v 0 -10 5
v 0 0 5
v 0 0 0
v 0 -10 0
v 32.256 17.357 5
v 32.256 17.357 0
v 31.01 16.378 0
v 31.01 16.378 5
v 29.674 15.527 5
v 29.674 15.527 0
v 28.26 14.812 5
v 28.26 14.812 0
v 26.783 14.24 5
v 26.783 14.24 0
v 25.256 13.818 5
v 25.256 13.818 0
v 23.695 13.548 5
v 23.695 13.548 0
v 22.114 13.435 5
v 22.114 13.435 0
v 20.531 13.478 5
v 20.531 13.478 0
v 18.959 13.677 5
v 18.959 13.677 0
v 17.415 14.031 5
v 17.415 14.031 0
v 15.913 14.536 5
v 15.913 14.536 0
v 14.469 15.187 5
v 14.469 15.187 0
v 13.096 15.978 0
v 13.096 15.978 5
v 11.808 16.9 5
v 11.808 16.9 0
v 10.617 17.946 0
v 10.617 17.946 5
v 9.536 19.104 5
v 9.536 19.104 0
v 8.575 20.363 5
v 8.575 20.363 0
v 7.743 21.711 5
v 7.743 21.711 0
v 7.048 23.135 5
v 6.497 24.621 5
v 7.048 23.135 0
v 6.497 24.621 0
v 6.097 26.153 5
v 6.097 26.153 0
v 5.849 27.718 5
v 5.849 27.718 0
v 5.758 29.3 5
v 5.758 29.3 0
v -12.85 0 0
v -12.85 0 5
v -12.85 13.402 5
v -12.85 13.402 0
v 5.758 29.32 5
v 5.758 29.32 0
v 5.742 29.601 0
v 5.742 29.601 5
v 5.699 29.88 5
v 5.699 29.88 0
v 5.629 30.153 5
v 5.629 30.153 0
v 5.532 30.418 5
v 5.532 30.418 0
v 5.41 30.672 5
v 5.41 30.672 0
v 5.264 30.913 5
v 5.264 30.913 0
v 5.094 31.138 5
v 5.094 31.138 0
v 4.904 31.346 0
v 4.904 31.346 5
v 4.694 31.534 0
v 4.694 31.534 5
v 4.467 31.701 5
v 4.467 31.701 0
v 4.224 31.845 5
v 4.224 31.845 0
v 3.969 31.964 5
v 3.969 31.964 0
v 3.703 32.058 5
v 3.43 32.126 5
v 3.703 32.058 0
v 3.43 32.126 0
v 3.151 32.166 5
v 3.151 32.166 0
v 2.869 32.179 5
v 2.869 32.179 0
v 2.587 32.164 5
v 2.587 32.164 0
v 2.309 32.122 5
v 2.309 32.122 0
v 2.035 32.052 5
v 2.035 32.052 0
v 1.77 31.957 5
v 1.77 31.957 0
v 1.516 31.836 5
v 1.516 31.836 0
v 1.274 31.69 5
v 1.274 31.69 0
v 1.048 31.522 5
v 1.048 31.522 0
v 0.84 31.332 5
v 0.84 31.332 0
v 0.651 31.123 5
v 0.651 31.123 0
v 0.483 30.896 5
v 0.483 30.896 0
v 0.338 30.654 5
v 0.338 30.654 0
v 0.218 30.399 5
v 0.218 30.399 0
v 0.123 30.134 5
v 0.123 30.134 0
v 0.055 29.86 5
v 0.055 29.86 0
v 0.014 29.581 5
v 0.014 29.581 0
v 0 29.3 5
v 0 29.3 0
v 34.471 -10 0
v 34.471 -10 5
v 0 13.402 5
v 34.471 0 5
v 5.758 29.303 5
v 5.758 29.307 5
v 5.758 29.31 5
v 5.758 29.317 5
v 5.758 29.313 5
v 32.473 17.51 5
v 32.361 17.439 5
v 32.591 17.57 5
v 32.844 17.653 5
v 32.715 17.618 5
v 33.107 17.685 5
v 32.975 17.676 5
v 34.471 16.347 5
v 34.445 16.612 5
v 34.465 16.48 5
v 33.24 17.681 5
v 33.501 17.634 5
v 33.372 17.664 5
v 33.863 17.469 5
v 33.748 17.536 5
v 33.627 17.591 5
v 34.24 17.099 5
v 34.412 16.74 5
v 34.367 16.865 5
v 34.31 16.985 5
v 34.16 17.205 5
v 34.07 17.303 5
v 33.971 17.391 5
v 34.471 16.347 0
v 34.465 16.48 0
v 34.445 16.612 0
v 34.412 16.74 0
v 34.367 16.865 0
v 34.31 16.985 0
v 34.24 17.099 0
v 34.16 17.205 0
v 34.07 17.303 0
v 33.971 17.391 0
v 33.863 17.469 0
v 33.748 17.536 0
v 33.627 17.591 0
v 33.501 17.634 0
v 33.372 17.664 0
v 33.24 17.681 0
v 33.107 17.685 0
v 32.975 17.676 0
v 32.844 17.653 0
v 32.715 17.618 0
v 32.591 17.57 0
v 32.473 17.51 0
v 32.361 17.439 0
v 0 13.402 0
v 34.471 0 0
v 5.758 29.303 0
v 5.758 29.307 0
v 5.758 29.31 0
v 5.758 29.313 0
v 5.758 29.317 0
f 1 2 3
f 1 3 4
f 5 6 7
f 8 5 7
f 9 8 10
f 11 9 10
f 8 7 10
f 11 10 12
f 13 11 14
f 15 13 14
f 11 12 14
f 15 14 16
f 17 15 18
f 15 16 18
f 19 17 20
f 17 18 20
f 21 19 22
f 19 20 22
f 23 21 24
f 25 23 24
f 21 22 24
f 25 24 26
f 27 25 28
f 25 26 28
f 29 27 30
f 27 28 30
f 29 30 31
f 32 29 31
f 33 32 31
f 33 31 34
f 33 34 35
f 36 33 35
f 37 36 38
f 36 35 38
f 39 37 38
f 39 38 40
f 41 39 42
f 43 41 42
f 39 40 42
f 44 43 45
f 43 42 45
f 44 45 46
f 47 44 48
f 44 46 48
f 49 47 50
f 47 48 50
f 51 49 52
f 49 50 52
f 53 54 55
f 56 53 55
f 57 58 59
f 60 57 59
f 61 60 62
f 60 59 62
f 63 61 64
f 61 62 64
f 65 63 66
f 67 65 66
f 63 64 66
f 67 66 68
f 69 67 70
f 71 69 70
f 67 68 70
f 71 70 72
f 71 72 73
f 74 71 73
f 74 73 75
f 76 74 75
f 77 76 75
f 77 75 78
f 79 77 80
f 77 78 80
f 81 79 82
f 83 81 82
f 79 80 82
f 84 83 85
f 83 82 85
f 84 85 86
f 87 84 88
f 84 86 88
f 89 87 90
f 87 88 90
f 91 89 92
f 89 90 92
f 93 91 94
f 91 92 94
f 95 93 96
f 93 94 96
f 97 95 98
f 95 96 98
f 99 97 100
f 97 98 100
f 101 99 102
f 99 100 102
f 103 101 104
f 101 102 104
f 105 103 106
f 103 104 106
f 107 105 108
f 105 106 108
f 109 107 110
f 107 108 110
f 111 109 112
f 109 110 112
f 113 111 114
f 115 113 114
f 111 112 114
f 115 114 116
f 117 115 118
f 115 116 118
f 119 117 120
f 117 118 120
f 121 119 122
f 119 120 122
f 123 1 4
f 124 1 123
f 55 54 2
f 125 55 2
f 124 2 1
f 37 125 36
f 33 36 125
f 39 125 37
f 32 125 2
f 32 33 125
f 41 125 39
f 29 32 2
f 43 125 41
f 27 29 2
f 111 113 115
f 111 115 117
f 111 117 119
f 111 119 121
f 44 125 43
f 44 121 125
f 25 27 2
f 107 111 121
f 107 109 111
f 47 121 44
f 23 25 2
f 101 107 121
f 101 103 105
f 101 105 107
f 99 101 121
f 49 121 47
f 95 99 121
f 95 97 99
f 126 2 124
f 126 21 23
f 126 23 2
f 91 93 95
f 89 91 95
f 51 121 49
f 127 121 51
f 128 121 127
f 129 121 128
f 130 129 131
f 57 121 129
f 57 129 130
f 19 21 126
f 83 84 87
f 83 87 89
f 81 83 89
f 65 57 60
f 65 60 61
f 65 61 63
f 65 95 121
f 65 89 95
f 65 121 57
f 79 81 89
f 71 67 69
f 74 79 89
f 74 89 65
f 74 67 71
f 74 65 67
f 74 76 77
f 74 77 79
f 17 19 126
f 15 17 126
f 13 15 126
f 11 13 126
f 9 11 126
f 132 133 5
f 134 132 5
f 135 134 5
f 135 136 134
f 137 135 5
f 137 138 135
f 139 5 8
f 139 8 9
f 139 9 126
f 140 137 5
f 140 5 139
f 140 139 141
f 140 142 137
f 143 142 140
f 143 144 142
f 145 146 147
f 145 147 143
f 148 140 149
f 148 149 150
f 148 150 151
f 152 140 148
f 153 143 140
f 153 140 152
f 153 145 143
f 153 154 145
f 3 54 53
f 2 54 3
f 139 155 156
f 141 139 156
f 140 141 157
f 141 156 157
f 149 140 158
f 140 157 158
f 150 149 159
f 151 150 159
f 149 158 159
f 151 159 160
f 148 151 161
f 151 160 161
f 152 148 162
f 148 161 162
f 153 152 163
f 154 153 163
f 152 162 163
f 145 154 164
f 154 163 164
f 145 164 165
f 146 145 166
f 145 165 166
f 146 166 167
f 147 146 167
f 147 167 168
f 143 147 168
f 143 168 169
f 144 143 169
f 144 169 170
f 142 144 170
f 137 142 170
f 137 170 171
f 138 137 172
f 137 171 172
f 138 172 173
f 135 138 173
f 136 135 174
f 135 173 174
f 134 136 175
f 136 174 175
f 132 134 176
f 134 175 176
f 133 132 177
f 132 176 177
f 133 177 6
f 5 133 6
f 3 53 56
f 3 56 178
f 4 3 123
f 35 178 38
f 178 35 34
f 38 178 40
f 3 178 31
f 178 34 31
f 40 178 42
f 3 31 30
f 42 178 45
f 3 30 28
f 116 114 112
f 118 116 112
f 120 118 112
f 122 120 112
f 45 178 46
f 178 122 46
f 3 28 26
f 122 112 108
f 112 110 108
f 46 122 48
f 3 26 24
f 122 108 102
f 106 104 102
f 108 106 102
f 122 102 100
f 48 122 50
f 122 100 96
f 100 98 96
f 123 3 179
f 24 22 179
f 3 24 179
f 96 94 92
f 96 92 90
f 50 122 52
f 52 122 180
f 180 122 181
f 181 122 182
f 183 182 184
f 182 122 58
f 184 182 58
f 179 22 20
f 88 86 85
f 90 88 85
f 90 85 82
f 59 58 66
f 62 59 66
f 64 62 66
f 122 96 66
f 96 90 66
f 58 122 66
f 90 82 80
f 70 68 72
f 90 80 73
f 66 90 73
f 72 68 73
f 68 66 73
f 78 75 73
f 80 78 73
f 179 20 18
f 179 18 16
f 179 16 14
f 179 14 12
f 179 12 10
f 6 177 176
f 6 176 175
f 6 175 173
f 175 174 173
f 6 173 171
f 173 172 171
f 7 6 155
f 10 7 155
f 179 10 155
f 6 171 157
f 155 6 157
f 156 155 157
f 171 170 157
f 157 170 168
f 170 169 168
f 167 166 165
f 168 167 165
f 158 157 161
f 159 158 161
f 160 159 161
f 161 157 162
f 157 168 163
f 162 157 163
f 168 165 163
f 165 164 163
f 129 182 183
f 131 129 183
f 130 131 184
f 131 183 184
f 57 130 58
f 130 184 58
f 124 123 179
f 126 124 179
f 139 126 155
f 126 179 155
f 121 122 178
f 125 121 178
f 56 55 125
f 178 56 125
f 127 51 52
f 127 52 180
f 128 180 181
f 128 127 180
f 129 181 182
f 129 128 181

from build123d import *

# Parameters (mm, degrees)
F1_DEPTH = 5
F2_W     = 34.4714387385
F2_H     = 10
F2_W_2   = 12.8498794511
F2_H_2   = 13.4021639824
F3_DEPTH = 5


# Not quite as in the source:
# - ends of sketch curves that miss each other by under 0.0002 mm in the source are joined
# - a feature names something its author has since deleted; it is built from what else it names


with BuildPart() as f1:
    # F0 (on Top) → F1 (new body)
    with BuildSketch(Plane.XY):
        with BuildLine():
            Line((0, 29.2999204248), (0, 0))
            Line((0, 0), (34.4714387385, 0))
            Line((34.4714387385, 0), (34.4714387385, 16.3473710418))
            ThreePointArc((34.4714387385, 16.3473710418), (32.5790927131, 15.1300794804), (32.2559916738, 17.3568210333))
            ThreePointArc((32.2559916738, 17.3568210333), (15.182844974, 14.8438668457), (5.7578901922, 29.2999210911))
            ThreePointArc((5.7578901922, 29.2999210911), (2.8789043427, 26.4210160822), (0, 29.2999204248))
        make_face()
        with BuildLine():
            ThreePointArc((5.7577396052, 29.3198639813), (2.8689325046, 32.1788074974), (0, 29.2999204248))
            ThreePointArc((0, 29.2999204248), (2.8789043427, 26.4210160822), (5.7578086853, 29.2999204248))
            ThreePointArc((5.7578086853, 29.2999204248), (5.7578117914, 29.3098925127), (5.7577396052, 29.3198639813))
        make_face()
        with BuildLine():
            ThreePointArc((32.2559916738, 17.3568210333), (32.5790927131, 15.1300794804), (34.4714387385, 16.3473710418))
            ThreePointArc((34.4714387385, 16.3473710418), (33.6883902233, 17.5646626032), (32.2559916738, 17.3568210333))
        make_face()
    extrude(amount=F1_DEPTH)

    # F2 (on face) → F3 (join)
    with BuildSketch(Plane.XY.offset(5)):
        with BuildLine():
            Line((0, 0), (34.4714387385, 0))
            Line((34.4714387385, 0), (34.4714387385, 16.3473710418))
            ThreePointArc((34.4714387385, 16.3473710418), (33.6883902233, 17.5646626032), (32.2559916738, 17.3568210333))
            ThreePointArc((32.2559916738, 17.3568210333), (15.182844974, 14.8438668457), (5.7578901922, 29.2999210911))
            ThreePointArc((5.7578901922, 29.2999210911), (5.757811792, 29.3098923335), (5.7577396052, 29.3198639813))
            ThreePointArc((5.7577396052, 29.3198639813), (2.8689325046, 32.1788074974), (0, 29.2999204248))
            Line((0, 29.2999204248), (0, 25.4882741719))
            Line((0, 25.4882741719), (0, 13.4021639824))
            Line((0, 13.4021639824), (0, 0))
        make_face()
        with Locations((17.2357193692, -5)):
            Rectangle(F2_W, F2_H)
        with Locations((-6.4249397255, 6.7010819912)):
            Rectangle(F2_W_2, F2_H_2)
    extrude(amount=-F3_DEPTH)


solid = f1.part
